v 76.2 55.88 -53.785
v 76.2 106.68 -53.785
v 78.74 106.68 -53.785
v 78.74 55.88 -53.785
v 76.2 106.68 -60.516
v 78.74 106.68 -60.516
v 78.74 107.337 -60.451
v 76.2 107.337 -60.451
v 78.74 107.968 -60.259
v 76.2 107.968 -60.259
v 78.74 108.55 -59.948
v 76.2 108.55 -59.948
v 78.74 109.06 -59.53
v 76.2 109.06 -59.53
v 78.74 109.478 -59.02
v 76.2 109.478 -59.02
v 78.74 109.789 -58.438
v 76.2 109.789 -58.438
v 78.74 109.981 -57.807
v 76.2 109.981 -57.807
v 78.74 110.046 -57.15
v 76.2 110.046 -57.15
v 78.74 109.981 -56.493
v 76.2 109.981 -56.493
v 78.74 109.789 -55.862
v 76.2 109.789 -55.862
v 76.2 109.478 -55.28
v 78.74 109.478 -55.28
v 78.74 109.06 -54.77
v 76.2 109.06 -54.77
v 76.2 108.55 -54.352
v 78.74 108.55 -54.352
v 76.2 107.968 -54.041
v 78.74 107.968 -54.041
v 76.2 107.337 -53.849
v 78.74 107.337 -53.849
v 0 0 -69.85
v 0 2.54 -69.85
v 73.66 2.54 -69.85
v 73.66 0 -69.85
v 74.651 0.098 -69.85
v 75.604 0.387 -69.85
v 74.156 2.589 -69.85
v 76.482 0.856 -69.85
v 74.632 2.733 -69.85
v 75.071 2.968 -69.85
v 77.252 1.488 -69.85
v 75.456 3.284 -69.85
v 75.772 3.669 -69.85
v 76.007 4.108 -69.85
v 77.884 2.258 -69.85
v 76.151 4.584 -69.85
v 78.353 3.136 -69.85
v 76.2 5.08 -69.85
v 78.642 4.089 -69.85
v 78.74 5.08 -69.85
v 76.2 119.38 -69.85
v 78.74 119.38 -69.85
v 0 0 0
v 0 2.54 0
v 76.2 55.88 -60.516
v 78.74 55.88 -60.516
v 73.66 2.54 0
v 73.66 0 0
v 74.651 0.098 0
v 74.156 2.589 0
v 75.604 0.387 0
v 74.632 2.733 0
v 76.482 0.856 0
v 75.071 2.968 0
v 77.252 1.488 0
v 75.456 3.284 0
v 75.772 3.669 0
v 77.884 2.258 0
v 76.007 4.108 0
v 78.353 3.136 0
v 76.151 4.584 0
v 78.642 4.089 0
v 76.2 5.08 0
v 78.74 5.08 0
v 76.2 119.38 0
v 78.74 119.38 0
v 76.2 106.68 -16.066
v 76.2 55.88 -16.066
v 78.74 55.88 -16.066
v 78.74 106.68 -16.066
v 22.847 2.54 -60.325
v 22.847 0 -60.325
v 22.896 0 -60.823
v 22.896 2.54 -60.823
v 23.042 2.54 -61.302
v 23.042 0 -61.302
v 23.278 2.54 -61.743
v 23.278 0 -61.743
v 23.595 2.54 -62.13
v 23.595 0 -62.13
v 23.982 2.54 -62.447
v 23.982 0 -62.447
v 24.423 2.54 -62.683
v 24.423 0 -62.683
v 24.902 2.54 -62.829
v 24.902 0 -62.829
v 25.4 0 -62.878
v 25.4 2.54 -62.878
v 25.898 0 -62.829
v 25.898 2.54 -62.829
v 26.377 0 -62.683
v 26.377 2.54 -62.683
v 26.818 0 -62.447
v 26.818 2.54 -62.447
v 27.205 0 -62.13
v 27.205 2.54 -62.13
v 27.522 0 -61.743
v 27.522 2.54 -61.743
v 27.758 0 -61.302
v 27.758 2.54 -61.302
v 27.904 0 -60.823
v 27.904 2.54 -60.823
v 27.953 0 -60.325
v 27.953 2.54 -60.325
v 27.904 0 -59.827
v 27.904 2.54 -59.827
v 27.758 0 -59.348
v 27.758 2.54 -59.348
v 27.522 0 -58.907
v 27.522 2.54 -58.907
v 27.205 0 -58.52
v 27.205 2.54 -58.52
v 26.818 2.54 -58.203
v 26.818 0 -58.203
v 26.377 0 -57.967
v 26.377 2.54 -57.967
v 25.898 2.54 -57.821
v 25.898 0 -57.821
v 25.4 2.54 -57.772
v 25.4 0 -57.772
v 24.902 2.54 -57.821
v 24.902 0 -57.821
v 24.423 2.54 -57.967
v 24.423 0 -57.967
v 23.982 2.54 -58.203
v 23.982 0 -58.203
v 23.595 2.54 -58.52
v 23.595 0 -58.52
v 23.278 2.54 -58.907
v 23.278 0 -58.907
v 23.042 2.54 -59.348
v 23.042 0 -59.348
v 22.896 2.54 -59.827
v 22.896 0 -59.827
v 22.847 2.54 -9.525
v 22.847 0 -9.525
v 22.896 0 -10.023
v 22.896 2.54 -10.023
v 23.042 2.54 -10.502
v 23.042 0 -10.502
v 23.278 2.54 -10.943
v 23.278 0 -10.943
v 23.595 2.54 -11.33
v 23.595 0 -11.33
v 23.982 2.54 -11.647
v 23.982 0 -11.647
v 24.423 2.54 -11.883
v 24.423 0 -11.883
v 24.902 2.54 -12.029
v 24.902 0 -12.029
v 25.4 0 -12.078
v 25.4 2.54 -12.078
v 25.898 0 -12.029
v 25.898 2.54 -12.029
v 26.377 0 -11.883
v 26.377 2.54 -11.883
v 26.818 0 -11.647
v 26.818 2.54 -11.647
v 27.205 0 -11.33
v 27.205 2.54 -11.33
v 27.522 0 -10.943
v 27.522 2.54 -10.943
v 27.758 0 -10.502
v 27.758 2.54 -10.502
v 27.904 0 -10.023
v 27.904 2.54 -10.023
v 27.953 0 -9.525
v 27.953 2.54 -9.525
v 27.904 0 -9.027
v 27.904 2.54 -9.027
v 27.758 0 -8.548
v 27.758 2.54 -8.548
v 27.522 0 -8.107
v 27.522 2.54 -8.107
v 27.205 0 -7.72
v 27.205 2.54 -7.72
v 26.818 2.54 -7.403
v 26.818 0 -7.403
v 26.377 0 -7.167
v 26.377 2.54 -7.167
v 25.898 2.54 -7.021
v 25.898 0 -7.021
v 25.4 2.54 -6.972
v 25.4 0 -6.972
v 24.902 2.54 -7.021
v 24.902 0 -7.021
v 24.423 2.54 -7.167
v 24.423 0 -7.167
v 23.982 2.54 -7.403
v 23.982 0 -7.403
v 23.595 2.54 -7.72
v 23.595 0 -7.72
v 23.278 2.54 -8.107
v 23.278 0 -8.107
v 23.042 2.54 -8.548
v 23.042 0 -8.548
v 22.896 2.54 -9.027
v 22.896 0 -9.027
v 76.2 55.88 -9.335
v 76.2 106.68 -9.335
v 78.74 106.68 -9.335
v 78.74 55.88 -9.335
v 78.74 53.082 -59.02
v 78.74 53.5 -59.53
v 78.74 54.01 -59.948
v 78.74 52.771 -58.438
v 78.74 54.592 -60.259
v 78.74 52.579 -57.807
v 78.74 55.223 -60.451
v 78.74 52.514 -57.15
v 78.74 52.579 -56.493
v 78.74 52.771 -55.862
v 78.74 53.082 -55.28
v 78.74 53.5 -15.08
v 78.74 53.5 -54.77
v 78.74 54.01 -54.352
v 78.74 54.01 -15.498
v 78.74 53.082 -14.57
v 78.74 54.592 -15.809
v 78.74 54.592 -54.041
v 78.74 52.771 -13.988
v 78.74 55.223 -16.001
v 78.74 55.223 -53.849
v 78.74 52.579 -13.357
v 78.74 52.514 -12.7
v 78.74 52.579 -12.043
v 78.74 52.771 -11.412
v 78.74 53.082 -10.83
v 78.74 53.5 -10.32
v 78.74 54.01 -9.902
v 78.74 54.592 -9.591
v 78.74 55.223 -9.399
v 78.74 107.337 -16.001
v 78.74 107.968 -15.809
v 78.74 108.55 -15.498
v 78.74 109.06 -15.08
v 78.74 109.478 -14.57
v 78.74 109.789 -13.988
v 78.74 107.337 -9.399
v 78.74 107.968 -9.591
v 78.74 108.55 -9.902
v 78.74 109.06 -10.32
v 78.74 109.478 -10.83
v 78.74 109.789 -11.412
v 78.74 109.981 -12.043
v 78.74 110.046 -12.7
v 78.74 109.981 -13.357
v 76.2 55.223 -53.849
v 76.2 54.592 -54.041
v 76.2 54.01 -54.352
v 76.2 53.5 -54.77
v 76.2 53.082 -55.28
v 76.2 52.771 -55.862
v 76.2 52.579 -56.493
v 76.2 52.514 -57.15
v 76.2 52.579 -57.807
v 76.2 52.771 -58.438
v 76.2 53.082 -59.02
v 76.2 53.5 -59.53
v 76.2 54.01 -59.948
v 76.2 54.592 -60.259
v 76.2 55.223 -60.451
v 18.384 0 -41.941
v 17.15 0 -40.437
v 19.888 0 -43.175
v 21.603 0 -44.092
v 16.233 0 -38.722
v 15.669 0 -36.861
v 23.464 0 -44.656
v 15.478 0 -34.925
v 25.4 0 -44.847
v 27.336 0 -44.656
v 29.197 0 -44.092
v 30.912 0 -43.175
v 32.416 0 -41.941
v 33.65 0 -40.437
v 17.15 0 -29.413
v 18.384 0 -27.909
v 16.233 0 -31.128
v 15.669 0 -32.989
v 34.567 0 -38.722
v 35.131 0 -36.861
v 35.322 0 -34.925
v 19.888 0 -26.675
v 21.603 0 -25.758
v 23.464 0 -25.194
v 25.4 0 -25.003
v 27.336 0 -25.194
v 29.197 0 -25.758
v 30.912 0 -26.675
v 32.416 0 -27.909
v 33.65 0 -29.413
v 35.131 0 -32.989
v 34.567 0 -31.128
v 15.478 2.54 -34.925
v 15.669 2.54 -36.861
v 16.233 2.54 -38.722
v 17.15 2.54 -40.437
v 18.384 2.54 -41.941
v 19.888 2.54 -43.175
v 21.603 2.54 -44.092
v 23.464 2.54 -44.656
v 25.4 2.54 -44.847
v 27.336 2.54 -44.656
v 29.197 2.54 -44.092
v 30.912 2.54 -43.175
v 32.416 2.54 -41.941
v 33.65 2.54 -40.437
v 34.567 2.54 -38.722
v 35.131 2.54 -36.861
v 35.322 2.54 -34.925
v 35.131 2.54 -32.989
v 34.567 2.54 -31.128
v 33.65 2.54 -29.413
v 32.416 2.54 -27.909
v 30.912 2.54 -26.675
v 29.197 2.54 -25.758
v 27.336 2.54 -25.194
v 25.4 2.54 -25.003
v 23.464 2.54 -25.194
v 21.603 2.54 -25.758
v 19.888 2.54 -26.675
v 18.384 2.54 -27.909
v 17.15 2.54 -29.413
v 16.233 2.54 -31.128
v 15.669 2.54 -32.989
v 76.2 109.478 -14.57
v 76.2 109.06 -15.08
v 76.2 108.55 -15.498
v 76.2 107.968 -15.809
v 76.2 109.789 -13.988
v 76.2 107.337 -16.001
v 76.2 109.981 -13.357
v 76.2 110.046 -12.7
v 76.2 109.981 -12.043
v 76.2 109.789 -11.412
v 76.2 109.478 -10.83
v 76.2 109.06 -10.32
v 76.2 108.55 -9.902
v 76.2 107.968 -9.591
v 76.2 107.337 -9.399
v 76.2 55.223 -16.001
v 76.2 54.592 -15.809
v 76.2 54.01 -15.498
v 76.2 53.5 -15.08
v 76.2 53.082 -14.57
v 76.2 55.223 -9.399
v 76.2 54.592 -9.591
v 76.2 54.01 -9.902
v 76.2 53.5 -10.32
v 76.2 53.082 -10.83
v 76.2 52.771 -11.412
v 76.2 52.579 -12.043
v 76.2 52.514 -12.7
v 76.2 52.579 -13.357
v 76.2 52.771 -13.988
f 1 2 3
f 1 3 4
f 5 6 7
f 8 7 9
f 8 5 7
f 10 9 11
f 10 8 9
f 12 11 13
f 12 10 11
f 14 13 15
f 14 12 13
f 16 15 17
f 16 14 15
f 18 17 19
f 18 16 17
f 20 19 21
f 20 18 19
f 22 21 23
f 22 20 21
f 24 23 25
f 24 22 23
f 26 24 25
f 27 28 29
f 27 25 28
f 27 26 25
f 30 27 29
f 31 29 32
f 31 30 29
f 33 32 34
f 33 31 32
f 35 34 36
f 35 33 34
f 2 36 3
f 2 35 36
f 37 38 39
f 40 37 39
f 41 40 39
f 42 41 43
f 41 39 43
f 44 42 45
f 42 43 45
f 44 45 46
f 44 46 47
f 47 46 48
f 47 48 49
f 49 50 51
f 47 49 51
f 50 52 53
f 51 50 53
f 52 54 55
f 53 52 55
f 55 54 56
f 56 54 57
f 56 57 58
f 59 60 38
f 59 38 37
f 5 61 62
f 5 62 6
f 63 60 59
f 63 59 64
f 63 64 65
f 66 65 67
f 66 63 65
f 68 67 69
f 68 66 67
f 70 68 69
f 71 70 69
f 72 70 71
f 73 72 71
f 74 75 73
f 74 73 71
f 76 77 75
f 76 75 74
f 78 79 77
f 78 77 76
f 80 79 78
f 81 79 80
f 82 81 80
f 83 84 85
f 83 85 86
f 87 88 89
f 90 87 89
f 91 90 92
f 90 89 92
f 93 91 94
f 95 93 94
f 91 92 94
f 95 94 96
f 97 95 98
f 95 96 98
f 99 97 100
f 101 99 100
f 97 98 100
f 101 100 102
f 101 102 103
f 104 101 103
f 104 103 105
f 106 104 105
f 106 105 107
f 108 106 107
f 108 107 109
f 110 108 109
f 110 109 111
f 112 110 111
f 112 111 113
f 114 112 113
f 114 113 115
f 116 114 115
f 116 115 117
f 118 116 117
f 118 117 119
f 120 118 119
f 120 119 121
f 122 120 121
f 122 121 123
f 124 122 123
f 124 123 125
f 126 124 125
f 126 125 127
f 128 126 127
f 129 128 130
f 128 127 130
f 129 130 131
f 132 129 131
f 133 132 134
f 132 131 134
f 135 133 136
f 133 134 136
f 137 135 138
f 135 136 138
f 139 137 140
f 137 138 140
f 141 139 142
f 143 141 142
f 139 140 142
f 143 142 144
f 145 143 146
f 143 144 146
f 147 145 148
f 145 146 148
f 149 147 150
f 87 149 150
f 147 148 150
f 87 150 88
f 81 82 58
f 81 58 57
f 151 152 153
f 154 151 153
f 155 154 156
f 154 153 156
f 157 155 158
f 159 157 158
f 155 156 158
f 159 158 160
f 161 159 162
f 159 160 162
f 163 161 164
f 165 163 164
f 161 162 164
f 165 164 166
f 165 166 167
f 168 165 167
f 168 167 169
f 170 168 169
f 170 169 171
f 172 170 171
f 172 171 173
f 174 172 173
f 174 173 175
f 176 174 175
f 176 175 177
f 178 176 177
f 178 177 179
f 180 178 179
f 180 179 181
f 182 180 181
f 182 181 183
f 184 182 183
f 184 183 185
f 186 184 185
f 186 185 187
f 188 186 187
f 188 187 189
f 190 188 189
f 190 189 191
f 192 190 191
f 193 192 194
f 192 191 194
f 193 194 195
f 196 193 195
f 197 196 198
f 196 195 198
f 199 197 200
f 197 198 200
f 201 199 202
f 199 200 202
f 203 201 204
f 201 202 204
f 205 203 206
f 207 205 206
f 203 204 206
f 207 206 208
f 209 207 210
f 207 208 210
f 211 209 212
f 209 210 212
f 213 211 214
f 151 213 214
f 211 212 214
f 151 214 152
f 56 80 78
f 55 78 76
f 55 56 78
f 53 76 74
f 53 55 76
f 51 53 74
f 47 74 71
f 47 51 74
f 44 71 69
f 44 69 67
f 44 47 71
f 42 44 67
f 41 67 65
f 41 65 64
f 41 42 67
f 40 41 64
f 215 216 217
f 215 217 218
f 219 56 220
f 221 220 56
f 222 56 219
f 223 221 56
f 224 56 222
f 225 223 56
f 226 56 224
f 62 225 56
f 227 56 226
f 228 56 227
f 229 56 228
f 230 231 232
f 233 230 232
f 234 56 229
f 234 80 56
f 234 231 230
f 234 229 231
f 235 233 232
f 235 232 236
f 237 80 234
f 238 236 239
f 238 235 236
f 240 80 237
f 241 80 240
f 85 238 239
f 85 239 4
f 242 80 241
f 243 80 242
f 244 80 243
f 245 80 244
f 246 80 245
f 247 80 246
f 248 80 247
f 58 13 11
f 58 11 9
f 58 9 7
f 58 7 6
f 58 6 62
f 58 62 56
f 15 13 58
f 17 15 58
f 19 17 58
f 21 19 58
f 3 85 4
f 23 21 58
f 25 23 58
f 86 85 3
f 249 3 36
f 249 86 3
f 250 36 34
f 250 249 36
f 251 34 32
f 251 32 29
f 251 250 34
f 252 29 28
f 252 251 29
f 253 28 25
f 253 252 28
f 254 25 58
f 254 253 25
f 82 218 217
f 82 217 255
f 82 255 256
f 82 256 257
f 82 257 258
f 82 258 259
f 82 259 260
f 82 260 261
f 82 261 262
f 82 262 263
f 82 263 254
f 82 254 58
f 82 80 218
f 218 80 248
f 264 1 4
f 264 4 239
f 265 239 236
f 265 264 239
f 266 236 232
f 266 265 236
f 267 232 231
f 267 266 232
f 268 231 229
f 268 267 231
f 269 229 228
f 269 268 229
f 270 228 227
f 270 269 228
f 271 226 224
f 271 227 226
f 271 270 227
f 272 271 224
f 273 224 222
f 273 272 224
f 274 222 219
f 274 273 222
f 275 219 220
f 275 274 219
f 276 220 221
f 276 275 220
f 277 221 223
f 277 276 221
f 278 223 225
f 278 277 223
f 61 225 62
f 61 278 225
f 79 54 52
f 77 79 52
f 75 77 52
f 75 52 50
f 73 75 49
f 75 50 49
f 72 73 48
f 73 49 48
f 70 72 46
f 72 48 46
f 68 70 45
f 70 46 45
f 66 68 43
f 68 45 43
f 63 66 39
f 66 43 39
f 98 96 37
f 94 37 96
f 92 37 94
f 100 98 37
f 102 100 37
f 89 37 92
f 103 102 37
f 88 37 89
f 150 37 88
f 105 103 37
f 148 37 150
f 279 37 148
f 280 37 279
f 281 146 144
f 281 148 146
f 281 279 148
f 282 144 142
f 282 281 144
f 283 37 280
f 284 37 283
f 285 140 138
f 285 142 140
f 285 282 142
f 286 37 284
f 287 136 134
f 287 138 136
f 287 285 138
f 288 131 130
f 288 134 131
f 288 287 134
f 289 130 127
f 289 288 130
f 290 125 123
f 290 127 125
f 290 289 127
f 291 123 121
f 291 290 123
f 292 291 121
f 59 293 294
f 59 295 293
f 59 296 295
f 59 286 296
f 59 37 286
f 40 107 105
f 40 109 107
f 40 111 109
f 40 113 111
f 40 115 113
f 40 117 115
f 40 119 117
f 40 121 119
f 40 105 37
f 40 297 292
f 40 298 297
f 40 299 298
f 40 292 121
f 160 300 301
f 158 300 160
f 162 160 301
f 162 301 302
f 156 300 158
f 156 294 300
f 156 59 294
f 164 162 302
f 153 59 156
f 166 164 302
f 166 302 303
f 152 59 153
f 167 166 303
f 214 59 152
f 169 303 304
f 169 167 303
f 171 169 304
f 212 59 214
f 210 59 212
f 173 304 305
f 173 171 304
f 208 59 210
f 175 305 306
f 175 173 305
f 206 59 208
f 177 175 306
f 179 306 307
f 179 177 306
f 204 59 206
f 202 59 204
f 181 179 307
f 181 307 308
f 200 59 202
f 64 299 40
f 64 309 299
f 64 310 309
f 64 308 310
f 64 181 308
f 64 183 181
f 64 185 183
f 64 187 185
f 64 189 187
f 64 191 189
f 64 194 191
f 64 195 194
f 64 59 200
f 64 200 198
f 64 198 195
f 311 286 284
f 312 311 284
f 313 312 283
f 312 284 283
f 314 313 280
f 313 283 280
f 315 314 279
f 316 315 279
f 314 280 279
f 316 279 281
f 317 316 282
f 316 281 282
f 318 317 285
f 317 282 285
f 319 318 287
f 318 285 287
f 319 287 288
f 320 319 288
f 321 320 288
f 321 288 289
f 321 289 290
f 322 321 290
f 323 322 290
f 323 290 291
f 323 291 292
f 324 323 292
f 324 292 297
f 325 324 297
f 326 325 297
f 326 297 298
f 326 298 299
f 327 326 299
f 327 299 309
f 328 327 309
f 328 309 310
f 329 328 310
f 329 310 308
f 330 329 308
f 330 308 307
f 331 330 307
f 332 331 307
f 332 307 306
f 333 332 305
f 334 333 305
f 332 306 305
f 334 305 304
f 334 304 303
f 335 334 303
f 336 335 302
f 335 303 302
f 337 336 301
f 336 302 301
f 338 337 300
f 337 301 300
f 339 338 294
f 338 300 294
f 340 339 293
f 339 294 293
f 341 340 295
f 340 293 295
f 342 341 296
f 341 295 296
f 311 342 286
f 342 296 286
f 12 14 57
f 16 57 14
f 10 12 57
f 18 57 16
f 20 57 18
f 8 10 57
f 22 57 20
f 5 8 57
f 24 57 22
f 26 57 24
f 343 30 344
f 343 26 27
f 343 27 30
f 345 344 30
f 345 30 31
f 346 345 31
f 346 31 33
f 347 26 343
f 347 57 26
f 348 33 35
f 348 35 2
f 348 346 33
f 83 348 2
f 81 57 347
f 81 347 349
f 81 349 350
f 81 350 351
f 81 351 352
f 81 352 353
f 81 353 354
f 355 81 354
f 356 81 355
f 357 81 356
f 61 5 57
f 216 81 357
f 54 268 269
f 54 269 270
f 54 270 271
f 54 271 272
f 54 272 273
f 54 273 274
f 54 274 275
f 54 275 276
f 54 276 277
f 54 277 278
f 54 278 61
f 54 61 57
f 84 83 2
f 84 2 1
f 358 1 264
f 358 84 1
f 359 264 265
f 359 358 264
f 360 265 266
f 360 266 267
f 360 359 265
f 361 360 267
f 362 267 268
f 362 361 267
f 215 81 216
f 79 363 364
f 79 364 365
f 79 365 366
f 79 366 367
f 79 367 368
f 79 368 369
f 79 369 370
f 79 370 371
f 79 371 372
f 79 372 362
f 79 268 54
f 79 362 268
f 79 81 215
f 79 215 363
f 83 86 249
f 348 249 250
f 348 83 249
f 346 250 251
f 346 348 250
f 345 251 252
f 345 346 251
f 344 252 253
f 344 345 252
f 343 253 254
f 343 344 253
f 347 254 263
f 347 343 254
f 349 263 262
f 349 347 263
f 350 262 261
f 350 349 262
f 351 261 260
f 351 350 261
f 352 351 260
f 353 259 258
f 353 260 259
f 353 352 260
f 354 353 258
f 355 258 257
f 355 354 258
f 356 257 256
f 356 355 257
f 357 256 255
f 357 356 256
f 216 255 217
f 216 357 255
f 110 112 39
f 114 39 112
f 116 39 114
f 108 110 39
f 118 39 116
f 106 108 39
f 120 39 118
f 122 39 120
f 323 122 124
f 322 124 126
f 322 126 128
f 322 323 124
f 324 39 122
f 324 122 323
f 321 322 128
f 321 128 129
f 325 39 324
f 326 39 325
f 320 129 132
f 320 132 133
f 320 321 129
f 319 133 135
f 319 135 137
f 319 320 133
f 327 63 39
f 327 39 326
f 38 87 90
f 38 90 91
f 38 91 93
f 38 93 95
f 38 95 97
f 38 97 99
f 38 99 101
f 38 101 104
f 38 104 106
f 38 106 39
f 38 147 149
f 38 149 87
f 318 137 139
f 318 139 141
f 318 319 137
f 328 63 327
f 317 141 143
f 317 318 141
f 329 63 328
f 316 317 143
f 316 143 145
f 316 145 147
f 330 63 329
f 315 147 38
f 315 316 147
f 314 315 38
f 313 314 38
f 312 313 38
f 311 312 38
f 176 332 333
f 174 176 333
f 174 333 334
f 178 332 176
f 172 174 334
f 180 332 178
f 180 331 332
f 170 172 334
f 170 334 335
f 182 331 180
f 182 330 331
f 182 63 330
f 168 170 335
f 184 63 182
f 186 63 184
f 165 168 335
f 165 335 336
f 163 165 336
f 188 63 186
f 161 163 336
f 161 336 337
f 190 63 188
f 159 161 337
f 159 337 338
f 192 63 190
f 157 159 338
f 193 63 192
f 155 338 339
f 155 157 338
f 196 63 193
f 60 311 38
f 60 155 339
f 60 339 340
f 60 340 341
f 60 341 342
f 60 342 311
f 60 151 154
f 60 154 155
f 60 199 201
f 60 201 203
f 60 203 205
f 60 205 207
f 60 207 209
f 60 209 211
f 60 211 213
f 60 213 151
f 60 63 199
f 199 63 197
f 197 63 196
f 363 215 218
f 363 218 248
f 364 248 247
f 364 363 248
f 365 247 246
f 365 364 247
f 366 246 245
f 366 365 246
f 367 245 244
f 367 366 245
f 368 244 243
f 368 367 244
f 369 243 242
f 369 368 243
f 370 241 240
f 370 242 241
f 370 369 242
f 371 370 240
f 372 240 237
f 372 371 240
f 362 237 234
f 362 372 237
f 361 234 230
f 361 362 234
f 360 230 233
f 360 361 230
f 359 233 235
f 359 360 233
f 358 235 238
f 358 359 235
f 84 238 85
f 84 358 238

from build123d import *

# Parameters (mm, degrees)
BOSS_EXTRUDE2_DEPTH                  = 69.85
F_10_CLEARANCE_HOLE1_D               = 5.1054
CUT_EXTRUDE1_DEPTH                   = 158.914682345
F_25_32_0_78125_DIAMETER_HOLE1_D     = 19.84375
F_25_32_0_78125_DIAMETER_HOLE1_DEPTH = 9.278336046
F_25_32_0_78125_DIAMETER_HOLE1_TIP   = 5.961663954
CONVERT_SOLID1_START                 = -69.85
CONVERT_SOLID1_DEPTH                 = 69.85
CONVERT_SOLID1_2_DEPTH               = 69.85


# Read off the part's stored shape, not the designer's step: Convert-Solid1
with BuildPart() as part:
    # Sketch8 → Boss-Extrude2 (new body)
    with BuildSketch(Plane.XY):
        Polygon((0, 2.54), (0, 0), (78.74, 0), (78.74, 119.38), (76.2, 119.38), (76.2, 2.54), align=None)
    extrude(amount=-BOSS_EXTRUDE2_DEPTH)

    # #10 Clearance Hole1 (through all)
    with Locations(Plane(origin=(0, 2.54, 0), x_dir=(1, 0, 0), z_dir=(0, 1, 0))):
        with Locations((25.4, 9.525), (25.4, 60.325)):
            Hole(F_10_CLEARANCE_HOLE1_D / 2)

    # E → Cut-Extrude1 (cut, through all)
    with BuildSketch(Plane.ZY.offset(-76.2)):
        with BuildLine():
            Line((-53.7845, 106.68), (-53.7845, 55.88))
            ThreePointArc((-53.7845, 55.88), (-57.15, 52.5145), (-60.5155, 55.88))
            Line((-60.5155, 55.88), (-60.5155, 106.68))
            ThreePointArc((-60.5155, 106.68), (-57.15, 110.0455), (-53.7845, 106.68))
        make_face()
        with BuildLine():
            Line((-9.3345, 106.68), (-9.3345, 55.88))
            ThreePointArc((-9.3345, 55.88), (-12.7, 52.5145), (-16.0655, 55.88))
            Line((-16.0655, 55.88), (-16.0655, 106.68))
            ThreePointArc((-16.0655, 106.68), (-12.7, 110.0455), (-9.3345, 106.68))
        make_face()
    extrude(amount=-CUT_EXTRUDE1_DEPTH, mode=Mode.SUBTRACT)

    # 25/32 (0.78125) Diameter Hole1
    with Locations(Plane(origin=(0, 2.54, 0), x_dir=(1, 0, 0), z_dir=(0, 1, 0))):
        with Locations((25.4, 34.925)):
            Hole(F_25_32_0_78125_DIAMETER_HOLE1_D / 2, depth=F_25_32_0_78125_DIAMETER_HOLE1_DEPTH)
            with Locations((0, 0, -(F_25_32_0_78125_DIAMETER_HOLE1_DEPTH + F_25_32_0_78125_DIAMETER_HOLE1_TIP / 2))):  # 118° drill point
                Cone(0, F_25_32_0_78125_DIAMETER_HOLE1_D / 2, F_25_32_0_78125_DIAMETER_HOLE1_TIP, mode=Mode.SUBTRACT)

    # Convert-Solid1 outline → Convert-Solid1 (cut)
    with BuildSketch(Plane.XY.offset(CONVERT_SOLID1_START)):
        with BuildLine():
            ThreePointArc((78.74, 5.08), (77.252102448, 1.487897552), (73.66, 0))
            Line((73.66, 0), (78.74, 0))
            Line((78.74, 0), (78.74, 5.08))
        make_face()
    extrude(amount=CONVERT_SOLID1_DEPTH, mode=Mode.SUBTRACT)

    # Convert-Solid1 2 outline → Convert-Solid1 2 (add)
    with BuildSketch(Plane.XY.offset(CONVERT_SOLID1_START)):
        with BuildLine():
            ThreePointArc((76.2, 5.08), (75.456051224, 3.283948776), (73.66, 2.54))
            Line((73.66, 2.54), (76.2, 2.54))
            Line((76.2, 2.54), (76.2, 5.08))
        make_face()
    extrude(amount=CONVERT_SOLID1_2_DEPTH)


solid = part.part
